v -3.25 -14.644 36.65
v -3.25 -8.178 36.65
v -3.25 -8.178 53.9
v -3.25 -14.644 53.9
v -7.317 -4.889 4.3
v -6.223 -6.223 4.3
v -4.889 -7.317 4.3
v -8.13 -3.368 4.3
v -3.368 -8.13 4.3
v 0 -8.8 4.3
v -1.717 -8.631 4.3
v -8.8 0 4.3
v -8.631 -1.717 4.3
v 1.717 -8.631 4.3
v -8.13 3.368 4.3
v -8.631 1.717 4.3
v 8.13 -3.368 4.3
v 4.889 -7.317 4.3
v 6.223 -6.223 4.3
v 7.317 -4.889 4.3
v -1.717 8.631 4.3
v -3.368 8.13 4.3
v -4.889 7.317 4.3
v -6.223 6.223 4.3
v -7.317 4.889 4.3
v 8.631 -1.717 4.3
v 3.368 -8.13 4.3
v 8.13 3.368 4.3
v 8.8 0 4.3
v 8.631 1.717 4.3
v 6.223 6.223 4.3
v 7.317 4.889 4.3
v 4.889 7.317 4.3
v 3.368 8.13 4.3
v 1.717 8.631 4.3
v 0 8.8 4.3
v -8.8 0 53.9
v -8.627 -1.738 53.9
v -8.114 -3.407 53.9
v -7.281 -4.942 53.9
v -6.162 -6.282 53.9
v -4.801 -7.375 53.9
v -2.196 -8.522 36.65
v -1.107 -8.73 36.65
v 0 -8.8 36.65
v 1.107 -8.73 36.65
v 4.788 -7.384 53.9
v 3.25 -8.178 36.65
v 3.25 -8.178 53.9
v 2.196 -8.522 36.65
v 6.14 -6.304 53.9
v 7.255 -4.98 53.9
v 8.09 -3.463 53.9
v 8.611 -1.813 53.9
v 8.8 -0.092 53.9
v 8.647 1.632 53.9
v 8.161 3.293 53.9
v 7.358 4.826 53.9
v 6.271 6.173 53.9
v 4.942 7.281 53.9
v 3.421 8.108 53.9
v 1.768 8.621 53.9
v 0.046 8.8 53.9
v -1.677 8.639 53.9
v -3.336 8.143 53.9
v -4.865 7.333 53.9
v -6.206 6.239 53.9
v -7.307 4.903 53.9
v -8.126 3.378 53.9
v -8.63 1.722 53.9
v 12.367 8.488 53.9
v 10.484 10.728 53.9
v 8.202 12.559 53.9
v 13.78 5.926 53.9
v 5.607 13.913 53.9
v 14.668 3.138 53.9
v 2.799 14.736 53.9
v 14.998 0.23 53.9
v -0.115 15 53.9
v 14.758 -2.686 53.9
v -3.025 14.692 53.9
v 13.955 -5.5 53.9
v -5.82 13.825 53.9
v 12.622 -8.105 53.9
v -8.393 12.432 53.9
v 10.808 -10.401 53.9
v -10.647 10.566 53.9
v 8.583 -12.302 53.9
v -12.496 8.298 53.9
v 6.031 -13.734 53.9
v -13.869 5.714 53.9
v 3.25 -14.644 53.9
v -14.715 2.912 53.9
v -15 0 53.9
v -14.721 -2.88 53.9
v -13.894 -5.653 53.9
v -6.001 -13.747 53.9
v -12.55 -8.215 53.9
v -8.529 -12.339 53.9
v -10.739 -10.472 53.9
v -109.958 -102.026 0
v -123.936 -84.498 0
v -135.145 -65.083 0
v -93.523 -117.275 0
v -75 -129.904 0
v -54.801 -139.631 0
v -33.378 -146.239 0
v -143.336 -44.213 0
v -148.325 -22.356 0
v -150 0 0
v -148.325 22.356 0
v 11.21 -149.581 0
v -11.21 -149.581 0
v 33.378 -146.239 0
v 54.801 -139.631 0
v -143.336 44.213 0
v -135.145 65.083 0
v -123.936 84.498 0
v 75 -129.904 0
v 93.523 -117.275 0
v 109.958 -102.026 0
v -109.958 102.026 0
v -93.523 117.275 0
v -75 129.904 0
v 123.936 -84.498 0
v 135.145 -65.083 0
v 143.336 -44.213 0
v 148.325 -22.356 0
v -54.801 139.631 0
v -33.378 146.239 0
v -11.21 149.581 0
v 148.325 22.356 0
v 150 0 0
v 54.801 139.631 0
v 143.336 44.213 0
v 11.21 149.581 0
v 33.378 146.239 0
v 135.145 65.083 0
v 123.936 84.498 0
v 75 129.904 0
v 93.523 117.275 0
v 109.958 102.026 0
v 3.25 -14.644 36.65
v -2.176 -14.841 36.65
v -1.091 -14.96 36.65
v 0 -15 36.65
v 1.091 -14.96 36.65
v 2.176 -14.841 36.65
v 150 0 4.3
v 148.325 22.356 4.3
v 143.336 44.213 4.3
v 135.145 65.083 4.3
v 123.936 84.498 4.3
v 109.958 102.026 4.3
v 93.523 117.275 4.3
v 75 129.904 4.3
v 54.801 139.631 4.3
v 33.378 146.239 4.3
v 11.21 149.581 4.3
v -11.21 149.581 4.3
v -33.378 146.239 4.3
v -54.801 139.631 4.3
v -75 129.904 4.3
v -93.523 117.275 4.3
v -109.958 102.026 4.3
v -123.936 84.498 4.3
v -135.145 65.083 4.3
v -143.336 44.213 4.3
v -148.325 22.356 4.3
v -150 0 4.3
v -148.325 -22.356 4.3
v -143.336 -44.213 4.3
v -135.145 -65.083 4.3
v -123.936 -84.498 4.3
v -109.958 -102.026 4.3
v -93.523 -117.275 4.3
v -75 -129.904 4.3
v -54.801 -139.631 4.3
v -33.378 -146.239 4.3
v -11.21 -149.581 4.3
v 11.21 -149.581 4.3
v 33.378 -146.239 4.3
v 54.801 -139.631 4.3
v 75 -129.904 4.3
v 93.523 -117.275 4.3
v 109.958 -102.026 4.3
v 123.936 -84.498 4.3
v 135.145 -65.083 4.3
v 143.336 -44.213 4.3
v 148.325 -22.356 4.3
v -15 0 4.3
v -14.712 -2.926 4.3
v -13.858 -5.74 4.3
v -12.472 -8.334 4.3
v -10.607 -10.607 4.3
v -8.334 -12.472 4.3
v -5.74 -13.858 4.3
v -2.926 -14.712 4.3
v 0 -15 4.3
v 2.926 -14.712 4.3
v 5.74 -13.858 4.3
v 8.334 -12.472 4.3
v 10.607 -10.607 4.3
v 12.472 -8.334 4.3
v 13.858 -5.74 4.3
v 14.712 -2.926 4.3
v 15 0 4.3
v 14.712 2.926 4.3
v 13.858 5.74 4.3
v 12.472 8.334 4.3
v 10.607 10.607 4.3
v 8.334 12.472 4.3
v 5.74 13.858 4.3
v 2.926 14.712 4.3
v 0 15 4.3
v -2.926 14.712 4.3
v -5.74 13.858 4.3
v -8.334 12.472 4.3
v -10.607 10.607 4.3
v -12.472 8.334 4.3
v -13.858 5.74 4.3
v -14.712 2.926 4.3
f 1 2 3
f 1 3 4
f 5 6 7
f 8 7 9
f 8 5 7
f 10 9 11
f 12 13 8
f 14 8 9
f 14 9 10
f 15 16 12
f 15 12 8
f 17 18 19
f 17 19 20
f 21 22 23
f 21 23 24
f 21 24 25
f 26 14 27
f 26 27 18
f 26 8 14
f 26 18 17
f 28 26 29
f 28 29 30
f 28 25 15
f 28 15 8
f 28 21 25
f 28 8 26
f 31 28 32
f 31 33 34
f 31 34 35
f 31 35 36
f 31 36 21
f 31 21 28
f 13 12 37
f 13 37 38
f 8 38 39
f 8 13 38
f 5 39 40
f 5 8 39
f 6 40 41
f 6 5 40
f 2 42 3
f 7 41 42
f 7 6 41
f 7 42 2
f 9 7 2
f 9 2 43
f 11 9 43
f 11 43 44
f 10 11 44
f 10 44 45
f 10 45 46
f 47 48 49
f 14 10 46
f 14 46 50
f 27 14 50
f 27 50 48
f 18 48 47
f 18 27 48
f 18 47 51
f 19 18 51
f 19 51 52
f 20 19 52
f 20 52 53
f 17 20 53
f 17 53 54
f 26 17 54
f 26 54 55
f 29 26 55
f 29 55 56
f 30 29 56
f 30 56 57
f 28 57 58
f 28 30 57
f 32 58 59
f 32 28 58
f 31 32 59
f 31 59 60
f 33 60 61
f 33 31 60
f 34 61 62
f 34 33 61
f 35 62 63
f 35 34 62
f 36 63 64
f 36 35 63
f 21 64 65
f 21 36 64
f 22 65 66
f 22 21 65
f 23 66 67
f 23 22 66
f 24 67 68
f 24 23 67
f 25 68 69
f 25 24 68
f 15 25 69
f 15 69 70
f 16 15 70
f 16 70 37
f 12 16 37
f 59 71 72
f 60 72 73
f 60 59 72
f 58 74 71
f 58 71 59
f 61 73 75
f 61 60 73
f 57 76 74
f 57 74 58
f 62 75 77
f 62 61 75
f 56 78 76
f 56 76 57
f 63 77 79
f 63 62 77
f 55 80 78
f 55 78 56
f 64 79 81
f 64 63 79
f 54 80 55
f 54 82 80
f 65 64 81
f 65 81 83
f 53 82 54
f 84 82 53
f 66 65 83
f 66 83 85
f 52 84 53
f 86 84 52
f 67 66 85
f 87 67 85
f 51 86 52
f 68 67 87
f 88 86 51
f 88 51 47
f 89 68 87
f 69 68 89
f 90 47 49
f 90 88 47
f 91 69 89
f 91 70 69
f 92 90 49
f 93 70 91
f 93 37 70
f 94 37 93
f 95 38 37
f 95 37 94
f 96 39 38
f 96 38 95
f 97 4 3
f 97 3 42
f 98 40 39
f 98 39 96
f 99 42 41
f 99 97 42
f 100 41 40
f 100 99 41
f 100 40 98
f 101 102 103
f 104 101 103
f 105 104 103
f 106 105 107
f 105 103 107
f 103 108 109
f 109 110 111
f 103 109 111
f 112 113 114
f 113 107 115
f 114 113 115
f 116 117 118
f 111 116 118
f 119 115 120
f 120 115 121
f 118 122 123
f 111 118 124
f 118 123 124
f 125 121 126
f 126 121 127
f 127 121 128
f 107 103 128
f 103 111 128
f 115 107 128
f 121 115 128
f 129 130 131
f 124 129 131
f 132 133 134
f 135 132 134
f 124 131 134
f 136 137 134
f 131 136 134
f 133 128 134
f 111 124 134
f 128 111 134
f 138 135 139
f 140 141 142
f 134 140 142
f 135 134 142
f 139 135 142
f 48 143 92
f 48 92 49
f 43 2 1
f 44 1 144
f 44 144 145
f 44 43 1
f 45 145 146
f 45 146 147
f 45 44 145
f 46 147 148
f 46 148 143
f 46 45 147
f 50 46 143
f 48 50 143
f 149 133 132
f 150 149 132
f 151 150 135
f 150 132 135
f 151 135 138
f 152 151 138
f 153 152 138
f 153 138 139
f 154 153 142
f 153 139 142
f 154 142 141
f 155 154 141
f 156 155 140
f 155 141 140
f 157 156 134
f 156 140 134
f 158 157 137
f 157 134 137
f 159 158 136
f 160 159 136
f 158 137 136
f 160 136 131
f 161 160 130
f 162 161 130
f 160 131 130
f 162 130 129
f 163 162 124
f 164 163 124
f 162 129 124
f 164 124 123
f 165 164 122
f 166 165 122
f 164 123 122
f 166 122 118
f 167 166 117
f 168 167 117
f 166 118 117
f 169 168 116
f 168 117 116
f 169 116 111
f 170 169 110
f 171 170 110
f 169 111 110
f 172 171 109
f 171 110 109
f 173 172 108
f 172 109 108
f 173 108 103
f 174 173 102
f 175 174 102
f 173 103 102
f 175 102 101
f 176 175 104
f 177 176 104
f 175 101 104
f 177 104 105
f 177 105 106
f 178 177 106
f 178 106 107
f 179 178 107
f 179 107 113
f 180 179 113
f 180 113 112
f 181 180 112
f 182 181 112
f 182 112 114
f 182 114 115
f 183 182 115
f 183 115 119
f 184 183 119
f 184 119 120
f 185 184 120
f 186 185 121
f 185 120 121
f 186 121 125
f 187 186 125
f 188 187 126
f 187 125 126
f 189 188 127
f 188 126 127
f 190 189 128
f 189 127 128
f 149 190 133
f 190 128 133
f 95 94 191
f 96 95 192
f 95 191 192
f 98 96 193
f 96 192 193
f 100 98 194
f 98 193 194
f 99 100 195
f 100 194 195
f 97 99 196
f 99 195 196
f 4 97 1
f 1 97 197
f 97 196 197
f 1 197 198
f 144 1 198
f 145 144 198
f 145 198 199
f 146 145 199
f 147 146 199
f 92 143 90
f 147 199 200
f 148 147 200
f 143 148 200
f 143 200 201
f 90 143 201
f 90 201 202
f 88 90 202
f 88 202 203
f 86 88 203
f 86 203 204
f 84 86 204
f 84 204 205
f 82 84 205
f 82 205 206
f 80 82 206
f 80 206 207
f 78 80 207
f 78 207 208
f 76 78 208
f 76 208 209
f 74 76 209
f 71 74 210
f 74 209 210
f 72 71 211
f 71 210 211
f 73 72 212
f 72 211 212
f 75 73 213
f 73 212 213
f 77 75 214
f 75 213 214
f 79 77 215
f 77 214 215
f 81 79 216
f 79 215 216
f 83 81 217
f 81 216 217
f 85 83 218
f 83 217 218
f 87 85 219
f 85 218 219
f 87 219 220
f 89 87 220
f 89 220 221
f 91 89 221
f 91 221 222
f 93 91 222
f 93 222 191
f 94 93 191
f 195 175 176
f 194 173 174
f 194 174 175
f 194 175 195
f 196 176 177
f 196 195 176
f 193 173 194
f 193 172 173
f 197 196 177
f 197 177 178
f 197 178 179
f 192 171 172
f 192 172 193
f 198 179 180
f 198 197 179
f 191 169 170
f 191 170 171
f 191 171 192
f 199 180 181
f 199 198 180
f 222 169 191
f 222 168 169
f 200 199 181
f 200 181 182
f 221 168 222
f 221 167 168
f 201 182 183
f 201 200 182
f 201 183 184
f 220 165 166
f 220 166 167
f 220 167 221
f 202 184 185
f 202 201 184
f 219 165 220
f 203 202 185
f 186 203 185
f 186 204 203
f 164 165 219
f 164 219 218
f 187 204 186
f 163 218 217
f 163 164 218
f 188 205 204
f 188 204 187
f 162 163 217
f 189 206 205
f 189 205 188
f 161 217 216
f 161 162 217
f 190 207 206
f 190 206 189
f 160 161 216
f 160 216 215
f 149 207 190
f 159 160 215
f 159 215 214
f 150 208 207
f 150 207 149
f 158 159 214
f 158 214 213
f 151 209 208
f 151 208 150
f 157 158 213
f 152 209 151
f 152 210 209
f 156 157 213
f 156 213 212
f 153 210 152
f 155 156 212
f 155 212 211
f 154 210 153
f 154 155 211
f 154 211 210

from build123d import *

# Parameters (mm, degrees)
SCHIZZO1_R                   = 150
ESTRUSIONE_ESTRUSIONE1_DEPTH = 4.3
SCHIZZO2_R                   = 15
SCHIZZO2_R_2                 = 8.8
ESTRUSIONE_ESTRUSIONE2_DEPTH = 49.6
TAGLIO_ESTRUSIONE1_START     = -17.25
TAGLIO_ESTRUSIONE1_DEPTH     = 17.25


with BuildPart() as part:
    # Schizzo1 → Estrusione-Estrusione1 (new body)
    with BuildSketch(Plane.XY):
        Circle(SCHIZZO1_R)
    extrude(amount=ESTRUSIONE_ESTRUSIONE1_DEPTH)

    # Schizzo2 → Estrusione-Estrusione2 (add)
    with BuildSketch(Plane.XY.offset(4.3)):
        with Locations(Location((0, 0, 0), (0, 0, 180))):
            Circle(SCHIZZO2_R)
        with Locations(Location((0, 0, 0), (0, 0, 180))):
            Circle(SCHIZZO2_R_2, mode=Mode.SUBTRACT)
    extrude(amount=ESTRUSIONE_ESTRUSIONE2_DEPTH)

    # Schizzo3 → Taglio-Estrusione1 (cut)
    with BuildSketch(Plane.XY.offset(53.9).offset(TAGLIO_ESTRUSIONE1_START)):
        with BuildLine():
            Line((0, -15), (0, -8.8))
            ThreePointArc((0, -8.8), (-1.654505223, -8.643067307), (-3.25, -8.17786647))
            Line((-3.25, -8.17786647), (-3.25, -14.643684646))
            ThreePointArc((-3.25, -14.643684646), (-1.63473703, -14.910655078), (0, -15))
        make_face()
        with BuildLine():
            ThreePointArc((3.25, -8.17786647), (1.654505223, -8.643067307), (0, -8.8))
            Line((0, -8.8), (0, -15))
            ThreePointArc((0, -15), (1.63473703, -14.910655078), (3.25, -14.643684646))
            Line((3.25, -14.643684646), (3.25, -8.17786647))
        make_face()
    extrude(amount=TAGLIO_ESTRUSIONE1_DEPTH, mode=Mode.SUBTRACT)


solid = part.part
